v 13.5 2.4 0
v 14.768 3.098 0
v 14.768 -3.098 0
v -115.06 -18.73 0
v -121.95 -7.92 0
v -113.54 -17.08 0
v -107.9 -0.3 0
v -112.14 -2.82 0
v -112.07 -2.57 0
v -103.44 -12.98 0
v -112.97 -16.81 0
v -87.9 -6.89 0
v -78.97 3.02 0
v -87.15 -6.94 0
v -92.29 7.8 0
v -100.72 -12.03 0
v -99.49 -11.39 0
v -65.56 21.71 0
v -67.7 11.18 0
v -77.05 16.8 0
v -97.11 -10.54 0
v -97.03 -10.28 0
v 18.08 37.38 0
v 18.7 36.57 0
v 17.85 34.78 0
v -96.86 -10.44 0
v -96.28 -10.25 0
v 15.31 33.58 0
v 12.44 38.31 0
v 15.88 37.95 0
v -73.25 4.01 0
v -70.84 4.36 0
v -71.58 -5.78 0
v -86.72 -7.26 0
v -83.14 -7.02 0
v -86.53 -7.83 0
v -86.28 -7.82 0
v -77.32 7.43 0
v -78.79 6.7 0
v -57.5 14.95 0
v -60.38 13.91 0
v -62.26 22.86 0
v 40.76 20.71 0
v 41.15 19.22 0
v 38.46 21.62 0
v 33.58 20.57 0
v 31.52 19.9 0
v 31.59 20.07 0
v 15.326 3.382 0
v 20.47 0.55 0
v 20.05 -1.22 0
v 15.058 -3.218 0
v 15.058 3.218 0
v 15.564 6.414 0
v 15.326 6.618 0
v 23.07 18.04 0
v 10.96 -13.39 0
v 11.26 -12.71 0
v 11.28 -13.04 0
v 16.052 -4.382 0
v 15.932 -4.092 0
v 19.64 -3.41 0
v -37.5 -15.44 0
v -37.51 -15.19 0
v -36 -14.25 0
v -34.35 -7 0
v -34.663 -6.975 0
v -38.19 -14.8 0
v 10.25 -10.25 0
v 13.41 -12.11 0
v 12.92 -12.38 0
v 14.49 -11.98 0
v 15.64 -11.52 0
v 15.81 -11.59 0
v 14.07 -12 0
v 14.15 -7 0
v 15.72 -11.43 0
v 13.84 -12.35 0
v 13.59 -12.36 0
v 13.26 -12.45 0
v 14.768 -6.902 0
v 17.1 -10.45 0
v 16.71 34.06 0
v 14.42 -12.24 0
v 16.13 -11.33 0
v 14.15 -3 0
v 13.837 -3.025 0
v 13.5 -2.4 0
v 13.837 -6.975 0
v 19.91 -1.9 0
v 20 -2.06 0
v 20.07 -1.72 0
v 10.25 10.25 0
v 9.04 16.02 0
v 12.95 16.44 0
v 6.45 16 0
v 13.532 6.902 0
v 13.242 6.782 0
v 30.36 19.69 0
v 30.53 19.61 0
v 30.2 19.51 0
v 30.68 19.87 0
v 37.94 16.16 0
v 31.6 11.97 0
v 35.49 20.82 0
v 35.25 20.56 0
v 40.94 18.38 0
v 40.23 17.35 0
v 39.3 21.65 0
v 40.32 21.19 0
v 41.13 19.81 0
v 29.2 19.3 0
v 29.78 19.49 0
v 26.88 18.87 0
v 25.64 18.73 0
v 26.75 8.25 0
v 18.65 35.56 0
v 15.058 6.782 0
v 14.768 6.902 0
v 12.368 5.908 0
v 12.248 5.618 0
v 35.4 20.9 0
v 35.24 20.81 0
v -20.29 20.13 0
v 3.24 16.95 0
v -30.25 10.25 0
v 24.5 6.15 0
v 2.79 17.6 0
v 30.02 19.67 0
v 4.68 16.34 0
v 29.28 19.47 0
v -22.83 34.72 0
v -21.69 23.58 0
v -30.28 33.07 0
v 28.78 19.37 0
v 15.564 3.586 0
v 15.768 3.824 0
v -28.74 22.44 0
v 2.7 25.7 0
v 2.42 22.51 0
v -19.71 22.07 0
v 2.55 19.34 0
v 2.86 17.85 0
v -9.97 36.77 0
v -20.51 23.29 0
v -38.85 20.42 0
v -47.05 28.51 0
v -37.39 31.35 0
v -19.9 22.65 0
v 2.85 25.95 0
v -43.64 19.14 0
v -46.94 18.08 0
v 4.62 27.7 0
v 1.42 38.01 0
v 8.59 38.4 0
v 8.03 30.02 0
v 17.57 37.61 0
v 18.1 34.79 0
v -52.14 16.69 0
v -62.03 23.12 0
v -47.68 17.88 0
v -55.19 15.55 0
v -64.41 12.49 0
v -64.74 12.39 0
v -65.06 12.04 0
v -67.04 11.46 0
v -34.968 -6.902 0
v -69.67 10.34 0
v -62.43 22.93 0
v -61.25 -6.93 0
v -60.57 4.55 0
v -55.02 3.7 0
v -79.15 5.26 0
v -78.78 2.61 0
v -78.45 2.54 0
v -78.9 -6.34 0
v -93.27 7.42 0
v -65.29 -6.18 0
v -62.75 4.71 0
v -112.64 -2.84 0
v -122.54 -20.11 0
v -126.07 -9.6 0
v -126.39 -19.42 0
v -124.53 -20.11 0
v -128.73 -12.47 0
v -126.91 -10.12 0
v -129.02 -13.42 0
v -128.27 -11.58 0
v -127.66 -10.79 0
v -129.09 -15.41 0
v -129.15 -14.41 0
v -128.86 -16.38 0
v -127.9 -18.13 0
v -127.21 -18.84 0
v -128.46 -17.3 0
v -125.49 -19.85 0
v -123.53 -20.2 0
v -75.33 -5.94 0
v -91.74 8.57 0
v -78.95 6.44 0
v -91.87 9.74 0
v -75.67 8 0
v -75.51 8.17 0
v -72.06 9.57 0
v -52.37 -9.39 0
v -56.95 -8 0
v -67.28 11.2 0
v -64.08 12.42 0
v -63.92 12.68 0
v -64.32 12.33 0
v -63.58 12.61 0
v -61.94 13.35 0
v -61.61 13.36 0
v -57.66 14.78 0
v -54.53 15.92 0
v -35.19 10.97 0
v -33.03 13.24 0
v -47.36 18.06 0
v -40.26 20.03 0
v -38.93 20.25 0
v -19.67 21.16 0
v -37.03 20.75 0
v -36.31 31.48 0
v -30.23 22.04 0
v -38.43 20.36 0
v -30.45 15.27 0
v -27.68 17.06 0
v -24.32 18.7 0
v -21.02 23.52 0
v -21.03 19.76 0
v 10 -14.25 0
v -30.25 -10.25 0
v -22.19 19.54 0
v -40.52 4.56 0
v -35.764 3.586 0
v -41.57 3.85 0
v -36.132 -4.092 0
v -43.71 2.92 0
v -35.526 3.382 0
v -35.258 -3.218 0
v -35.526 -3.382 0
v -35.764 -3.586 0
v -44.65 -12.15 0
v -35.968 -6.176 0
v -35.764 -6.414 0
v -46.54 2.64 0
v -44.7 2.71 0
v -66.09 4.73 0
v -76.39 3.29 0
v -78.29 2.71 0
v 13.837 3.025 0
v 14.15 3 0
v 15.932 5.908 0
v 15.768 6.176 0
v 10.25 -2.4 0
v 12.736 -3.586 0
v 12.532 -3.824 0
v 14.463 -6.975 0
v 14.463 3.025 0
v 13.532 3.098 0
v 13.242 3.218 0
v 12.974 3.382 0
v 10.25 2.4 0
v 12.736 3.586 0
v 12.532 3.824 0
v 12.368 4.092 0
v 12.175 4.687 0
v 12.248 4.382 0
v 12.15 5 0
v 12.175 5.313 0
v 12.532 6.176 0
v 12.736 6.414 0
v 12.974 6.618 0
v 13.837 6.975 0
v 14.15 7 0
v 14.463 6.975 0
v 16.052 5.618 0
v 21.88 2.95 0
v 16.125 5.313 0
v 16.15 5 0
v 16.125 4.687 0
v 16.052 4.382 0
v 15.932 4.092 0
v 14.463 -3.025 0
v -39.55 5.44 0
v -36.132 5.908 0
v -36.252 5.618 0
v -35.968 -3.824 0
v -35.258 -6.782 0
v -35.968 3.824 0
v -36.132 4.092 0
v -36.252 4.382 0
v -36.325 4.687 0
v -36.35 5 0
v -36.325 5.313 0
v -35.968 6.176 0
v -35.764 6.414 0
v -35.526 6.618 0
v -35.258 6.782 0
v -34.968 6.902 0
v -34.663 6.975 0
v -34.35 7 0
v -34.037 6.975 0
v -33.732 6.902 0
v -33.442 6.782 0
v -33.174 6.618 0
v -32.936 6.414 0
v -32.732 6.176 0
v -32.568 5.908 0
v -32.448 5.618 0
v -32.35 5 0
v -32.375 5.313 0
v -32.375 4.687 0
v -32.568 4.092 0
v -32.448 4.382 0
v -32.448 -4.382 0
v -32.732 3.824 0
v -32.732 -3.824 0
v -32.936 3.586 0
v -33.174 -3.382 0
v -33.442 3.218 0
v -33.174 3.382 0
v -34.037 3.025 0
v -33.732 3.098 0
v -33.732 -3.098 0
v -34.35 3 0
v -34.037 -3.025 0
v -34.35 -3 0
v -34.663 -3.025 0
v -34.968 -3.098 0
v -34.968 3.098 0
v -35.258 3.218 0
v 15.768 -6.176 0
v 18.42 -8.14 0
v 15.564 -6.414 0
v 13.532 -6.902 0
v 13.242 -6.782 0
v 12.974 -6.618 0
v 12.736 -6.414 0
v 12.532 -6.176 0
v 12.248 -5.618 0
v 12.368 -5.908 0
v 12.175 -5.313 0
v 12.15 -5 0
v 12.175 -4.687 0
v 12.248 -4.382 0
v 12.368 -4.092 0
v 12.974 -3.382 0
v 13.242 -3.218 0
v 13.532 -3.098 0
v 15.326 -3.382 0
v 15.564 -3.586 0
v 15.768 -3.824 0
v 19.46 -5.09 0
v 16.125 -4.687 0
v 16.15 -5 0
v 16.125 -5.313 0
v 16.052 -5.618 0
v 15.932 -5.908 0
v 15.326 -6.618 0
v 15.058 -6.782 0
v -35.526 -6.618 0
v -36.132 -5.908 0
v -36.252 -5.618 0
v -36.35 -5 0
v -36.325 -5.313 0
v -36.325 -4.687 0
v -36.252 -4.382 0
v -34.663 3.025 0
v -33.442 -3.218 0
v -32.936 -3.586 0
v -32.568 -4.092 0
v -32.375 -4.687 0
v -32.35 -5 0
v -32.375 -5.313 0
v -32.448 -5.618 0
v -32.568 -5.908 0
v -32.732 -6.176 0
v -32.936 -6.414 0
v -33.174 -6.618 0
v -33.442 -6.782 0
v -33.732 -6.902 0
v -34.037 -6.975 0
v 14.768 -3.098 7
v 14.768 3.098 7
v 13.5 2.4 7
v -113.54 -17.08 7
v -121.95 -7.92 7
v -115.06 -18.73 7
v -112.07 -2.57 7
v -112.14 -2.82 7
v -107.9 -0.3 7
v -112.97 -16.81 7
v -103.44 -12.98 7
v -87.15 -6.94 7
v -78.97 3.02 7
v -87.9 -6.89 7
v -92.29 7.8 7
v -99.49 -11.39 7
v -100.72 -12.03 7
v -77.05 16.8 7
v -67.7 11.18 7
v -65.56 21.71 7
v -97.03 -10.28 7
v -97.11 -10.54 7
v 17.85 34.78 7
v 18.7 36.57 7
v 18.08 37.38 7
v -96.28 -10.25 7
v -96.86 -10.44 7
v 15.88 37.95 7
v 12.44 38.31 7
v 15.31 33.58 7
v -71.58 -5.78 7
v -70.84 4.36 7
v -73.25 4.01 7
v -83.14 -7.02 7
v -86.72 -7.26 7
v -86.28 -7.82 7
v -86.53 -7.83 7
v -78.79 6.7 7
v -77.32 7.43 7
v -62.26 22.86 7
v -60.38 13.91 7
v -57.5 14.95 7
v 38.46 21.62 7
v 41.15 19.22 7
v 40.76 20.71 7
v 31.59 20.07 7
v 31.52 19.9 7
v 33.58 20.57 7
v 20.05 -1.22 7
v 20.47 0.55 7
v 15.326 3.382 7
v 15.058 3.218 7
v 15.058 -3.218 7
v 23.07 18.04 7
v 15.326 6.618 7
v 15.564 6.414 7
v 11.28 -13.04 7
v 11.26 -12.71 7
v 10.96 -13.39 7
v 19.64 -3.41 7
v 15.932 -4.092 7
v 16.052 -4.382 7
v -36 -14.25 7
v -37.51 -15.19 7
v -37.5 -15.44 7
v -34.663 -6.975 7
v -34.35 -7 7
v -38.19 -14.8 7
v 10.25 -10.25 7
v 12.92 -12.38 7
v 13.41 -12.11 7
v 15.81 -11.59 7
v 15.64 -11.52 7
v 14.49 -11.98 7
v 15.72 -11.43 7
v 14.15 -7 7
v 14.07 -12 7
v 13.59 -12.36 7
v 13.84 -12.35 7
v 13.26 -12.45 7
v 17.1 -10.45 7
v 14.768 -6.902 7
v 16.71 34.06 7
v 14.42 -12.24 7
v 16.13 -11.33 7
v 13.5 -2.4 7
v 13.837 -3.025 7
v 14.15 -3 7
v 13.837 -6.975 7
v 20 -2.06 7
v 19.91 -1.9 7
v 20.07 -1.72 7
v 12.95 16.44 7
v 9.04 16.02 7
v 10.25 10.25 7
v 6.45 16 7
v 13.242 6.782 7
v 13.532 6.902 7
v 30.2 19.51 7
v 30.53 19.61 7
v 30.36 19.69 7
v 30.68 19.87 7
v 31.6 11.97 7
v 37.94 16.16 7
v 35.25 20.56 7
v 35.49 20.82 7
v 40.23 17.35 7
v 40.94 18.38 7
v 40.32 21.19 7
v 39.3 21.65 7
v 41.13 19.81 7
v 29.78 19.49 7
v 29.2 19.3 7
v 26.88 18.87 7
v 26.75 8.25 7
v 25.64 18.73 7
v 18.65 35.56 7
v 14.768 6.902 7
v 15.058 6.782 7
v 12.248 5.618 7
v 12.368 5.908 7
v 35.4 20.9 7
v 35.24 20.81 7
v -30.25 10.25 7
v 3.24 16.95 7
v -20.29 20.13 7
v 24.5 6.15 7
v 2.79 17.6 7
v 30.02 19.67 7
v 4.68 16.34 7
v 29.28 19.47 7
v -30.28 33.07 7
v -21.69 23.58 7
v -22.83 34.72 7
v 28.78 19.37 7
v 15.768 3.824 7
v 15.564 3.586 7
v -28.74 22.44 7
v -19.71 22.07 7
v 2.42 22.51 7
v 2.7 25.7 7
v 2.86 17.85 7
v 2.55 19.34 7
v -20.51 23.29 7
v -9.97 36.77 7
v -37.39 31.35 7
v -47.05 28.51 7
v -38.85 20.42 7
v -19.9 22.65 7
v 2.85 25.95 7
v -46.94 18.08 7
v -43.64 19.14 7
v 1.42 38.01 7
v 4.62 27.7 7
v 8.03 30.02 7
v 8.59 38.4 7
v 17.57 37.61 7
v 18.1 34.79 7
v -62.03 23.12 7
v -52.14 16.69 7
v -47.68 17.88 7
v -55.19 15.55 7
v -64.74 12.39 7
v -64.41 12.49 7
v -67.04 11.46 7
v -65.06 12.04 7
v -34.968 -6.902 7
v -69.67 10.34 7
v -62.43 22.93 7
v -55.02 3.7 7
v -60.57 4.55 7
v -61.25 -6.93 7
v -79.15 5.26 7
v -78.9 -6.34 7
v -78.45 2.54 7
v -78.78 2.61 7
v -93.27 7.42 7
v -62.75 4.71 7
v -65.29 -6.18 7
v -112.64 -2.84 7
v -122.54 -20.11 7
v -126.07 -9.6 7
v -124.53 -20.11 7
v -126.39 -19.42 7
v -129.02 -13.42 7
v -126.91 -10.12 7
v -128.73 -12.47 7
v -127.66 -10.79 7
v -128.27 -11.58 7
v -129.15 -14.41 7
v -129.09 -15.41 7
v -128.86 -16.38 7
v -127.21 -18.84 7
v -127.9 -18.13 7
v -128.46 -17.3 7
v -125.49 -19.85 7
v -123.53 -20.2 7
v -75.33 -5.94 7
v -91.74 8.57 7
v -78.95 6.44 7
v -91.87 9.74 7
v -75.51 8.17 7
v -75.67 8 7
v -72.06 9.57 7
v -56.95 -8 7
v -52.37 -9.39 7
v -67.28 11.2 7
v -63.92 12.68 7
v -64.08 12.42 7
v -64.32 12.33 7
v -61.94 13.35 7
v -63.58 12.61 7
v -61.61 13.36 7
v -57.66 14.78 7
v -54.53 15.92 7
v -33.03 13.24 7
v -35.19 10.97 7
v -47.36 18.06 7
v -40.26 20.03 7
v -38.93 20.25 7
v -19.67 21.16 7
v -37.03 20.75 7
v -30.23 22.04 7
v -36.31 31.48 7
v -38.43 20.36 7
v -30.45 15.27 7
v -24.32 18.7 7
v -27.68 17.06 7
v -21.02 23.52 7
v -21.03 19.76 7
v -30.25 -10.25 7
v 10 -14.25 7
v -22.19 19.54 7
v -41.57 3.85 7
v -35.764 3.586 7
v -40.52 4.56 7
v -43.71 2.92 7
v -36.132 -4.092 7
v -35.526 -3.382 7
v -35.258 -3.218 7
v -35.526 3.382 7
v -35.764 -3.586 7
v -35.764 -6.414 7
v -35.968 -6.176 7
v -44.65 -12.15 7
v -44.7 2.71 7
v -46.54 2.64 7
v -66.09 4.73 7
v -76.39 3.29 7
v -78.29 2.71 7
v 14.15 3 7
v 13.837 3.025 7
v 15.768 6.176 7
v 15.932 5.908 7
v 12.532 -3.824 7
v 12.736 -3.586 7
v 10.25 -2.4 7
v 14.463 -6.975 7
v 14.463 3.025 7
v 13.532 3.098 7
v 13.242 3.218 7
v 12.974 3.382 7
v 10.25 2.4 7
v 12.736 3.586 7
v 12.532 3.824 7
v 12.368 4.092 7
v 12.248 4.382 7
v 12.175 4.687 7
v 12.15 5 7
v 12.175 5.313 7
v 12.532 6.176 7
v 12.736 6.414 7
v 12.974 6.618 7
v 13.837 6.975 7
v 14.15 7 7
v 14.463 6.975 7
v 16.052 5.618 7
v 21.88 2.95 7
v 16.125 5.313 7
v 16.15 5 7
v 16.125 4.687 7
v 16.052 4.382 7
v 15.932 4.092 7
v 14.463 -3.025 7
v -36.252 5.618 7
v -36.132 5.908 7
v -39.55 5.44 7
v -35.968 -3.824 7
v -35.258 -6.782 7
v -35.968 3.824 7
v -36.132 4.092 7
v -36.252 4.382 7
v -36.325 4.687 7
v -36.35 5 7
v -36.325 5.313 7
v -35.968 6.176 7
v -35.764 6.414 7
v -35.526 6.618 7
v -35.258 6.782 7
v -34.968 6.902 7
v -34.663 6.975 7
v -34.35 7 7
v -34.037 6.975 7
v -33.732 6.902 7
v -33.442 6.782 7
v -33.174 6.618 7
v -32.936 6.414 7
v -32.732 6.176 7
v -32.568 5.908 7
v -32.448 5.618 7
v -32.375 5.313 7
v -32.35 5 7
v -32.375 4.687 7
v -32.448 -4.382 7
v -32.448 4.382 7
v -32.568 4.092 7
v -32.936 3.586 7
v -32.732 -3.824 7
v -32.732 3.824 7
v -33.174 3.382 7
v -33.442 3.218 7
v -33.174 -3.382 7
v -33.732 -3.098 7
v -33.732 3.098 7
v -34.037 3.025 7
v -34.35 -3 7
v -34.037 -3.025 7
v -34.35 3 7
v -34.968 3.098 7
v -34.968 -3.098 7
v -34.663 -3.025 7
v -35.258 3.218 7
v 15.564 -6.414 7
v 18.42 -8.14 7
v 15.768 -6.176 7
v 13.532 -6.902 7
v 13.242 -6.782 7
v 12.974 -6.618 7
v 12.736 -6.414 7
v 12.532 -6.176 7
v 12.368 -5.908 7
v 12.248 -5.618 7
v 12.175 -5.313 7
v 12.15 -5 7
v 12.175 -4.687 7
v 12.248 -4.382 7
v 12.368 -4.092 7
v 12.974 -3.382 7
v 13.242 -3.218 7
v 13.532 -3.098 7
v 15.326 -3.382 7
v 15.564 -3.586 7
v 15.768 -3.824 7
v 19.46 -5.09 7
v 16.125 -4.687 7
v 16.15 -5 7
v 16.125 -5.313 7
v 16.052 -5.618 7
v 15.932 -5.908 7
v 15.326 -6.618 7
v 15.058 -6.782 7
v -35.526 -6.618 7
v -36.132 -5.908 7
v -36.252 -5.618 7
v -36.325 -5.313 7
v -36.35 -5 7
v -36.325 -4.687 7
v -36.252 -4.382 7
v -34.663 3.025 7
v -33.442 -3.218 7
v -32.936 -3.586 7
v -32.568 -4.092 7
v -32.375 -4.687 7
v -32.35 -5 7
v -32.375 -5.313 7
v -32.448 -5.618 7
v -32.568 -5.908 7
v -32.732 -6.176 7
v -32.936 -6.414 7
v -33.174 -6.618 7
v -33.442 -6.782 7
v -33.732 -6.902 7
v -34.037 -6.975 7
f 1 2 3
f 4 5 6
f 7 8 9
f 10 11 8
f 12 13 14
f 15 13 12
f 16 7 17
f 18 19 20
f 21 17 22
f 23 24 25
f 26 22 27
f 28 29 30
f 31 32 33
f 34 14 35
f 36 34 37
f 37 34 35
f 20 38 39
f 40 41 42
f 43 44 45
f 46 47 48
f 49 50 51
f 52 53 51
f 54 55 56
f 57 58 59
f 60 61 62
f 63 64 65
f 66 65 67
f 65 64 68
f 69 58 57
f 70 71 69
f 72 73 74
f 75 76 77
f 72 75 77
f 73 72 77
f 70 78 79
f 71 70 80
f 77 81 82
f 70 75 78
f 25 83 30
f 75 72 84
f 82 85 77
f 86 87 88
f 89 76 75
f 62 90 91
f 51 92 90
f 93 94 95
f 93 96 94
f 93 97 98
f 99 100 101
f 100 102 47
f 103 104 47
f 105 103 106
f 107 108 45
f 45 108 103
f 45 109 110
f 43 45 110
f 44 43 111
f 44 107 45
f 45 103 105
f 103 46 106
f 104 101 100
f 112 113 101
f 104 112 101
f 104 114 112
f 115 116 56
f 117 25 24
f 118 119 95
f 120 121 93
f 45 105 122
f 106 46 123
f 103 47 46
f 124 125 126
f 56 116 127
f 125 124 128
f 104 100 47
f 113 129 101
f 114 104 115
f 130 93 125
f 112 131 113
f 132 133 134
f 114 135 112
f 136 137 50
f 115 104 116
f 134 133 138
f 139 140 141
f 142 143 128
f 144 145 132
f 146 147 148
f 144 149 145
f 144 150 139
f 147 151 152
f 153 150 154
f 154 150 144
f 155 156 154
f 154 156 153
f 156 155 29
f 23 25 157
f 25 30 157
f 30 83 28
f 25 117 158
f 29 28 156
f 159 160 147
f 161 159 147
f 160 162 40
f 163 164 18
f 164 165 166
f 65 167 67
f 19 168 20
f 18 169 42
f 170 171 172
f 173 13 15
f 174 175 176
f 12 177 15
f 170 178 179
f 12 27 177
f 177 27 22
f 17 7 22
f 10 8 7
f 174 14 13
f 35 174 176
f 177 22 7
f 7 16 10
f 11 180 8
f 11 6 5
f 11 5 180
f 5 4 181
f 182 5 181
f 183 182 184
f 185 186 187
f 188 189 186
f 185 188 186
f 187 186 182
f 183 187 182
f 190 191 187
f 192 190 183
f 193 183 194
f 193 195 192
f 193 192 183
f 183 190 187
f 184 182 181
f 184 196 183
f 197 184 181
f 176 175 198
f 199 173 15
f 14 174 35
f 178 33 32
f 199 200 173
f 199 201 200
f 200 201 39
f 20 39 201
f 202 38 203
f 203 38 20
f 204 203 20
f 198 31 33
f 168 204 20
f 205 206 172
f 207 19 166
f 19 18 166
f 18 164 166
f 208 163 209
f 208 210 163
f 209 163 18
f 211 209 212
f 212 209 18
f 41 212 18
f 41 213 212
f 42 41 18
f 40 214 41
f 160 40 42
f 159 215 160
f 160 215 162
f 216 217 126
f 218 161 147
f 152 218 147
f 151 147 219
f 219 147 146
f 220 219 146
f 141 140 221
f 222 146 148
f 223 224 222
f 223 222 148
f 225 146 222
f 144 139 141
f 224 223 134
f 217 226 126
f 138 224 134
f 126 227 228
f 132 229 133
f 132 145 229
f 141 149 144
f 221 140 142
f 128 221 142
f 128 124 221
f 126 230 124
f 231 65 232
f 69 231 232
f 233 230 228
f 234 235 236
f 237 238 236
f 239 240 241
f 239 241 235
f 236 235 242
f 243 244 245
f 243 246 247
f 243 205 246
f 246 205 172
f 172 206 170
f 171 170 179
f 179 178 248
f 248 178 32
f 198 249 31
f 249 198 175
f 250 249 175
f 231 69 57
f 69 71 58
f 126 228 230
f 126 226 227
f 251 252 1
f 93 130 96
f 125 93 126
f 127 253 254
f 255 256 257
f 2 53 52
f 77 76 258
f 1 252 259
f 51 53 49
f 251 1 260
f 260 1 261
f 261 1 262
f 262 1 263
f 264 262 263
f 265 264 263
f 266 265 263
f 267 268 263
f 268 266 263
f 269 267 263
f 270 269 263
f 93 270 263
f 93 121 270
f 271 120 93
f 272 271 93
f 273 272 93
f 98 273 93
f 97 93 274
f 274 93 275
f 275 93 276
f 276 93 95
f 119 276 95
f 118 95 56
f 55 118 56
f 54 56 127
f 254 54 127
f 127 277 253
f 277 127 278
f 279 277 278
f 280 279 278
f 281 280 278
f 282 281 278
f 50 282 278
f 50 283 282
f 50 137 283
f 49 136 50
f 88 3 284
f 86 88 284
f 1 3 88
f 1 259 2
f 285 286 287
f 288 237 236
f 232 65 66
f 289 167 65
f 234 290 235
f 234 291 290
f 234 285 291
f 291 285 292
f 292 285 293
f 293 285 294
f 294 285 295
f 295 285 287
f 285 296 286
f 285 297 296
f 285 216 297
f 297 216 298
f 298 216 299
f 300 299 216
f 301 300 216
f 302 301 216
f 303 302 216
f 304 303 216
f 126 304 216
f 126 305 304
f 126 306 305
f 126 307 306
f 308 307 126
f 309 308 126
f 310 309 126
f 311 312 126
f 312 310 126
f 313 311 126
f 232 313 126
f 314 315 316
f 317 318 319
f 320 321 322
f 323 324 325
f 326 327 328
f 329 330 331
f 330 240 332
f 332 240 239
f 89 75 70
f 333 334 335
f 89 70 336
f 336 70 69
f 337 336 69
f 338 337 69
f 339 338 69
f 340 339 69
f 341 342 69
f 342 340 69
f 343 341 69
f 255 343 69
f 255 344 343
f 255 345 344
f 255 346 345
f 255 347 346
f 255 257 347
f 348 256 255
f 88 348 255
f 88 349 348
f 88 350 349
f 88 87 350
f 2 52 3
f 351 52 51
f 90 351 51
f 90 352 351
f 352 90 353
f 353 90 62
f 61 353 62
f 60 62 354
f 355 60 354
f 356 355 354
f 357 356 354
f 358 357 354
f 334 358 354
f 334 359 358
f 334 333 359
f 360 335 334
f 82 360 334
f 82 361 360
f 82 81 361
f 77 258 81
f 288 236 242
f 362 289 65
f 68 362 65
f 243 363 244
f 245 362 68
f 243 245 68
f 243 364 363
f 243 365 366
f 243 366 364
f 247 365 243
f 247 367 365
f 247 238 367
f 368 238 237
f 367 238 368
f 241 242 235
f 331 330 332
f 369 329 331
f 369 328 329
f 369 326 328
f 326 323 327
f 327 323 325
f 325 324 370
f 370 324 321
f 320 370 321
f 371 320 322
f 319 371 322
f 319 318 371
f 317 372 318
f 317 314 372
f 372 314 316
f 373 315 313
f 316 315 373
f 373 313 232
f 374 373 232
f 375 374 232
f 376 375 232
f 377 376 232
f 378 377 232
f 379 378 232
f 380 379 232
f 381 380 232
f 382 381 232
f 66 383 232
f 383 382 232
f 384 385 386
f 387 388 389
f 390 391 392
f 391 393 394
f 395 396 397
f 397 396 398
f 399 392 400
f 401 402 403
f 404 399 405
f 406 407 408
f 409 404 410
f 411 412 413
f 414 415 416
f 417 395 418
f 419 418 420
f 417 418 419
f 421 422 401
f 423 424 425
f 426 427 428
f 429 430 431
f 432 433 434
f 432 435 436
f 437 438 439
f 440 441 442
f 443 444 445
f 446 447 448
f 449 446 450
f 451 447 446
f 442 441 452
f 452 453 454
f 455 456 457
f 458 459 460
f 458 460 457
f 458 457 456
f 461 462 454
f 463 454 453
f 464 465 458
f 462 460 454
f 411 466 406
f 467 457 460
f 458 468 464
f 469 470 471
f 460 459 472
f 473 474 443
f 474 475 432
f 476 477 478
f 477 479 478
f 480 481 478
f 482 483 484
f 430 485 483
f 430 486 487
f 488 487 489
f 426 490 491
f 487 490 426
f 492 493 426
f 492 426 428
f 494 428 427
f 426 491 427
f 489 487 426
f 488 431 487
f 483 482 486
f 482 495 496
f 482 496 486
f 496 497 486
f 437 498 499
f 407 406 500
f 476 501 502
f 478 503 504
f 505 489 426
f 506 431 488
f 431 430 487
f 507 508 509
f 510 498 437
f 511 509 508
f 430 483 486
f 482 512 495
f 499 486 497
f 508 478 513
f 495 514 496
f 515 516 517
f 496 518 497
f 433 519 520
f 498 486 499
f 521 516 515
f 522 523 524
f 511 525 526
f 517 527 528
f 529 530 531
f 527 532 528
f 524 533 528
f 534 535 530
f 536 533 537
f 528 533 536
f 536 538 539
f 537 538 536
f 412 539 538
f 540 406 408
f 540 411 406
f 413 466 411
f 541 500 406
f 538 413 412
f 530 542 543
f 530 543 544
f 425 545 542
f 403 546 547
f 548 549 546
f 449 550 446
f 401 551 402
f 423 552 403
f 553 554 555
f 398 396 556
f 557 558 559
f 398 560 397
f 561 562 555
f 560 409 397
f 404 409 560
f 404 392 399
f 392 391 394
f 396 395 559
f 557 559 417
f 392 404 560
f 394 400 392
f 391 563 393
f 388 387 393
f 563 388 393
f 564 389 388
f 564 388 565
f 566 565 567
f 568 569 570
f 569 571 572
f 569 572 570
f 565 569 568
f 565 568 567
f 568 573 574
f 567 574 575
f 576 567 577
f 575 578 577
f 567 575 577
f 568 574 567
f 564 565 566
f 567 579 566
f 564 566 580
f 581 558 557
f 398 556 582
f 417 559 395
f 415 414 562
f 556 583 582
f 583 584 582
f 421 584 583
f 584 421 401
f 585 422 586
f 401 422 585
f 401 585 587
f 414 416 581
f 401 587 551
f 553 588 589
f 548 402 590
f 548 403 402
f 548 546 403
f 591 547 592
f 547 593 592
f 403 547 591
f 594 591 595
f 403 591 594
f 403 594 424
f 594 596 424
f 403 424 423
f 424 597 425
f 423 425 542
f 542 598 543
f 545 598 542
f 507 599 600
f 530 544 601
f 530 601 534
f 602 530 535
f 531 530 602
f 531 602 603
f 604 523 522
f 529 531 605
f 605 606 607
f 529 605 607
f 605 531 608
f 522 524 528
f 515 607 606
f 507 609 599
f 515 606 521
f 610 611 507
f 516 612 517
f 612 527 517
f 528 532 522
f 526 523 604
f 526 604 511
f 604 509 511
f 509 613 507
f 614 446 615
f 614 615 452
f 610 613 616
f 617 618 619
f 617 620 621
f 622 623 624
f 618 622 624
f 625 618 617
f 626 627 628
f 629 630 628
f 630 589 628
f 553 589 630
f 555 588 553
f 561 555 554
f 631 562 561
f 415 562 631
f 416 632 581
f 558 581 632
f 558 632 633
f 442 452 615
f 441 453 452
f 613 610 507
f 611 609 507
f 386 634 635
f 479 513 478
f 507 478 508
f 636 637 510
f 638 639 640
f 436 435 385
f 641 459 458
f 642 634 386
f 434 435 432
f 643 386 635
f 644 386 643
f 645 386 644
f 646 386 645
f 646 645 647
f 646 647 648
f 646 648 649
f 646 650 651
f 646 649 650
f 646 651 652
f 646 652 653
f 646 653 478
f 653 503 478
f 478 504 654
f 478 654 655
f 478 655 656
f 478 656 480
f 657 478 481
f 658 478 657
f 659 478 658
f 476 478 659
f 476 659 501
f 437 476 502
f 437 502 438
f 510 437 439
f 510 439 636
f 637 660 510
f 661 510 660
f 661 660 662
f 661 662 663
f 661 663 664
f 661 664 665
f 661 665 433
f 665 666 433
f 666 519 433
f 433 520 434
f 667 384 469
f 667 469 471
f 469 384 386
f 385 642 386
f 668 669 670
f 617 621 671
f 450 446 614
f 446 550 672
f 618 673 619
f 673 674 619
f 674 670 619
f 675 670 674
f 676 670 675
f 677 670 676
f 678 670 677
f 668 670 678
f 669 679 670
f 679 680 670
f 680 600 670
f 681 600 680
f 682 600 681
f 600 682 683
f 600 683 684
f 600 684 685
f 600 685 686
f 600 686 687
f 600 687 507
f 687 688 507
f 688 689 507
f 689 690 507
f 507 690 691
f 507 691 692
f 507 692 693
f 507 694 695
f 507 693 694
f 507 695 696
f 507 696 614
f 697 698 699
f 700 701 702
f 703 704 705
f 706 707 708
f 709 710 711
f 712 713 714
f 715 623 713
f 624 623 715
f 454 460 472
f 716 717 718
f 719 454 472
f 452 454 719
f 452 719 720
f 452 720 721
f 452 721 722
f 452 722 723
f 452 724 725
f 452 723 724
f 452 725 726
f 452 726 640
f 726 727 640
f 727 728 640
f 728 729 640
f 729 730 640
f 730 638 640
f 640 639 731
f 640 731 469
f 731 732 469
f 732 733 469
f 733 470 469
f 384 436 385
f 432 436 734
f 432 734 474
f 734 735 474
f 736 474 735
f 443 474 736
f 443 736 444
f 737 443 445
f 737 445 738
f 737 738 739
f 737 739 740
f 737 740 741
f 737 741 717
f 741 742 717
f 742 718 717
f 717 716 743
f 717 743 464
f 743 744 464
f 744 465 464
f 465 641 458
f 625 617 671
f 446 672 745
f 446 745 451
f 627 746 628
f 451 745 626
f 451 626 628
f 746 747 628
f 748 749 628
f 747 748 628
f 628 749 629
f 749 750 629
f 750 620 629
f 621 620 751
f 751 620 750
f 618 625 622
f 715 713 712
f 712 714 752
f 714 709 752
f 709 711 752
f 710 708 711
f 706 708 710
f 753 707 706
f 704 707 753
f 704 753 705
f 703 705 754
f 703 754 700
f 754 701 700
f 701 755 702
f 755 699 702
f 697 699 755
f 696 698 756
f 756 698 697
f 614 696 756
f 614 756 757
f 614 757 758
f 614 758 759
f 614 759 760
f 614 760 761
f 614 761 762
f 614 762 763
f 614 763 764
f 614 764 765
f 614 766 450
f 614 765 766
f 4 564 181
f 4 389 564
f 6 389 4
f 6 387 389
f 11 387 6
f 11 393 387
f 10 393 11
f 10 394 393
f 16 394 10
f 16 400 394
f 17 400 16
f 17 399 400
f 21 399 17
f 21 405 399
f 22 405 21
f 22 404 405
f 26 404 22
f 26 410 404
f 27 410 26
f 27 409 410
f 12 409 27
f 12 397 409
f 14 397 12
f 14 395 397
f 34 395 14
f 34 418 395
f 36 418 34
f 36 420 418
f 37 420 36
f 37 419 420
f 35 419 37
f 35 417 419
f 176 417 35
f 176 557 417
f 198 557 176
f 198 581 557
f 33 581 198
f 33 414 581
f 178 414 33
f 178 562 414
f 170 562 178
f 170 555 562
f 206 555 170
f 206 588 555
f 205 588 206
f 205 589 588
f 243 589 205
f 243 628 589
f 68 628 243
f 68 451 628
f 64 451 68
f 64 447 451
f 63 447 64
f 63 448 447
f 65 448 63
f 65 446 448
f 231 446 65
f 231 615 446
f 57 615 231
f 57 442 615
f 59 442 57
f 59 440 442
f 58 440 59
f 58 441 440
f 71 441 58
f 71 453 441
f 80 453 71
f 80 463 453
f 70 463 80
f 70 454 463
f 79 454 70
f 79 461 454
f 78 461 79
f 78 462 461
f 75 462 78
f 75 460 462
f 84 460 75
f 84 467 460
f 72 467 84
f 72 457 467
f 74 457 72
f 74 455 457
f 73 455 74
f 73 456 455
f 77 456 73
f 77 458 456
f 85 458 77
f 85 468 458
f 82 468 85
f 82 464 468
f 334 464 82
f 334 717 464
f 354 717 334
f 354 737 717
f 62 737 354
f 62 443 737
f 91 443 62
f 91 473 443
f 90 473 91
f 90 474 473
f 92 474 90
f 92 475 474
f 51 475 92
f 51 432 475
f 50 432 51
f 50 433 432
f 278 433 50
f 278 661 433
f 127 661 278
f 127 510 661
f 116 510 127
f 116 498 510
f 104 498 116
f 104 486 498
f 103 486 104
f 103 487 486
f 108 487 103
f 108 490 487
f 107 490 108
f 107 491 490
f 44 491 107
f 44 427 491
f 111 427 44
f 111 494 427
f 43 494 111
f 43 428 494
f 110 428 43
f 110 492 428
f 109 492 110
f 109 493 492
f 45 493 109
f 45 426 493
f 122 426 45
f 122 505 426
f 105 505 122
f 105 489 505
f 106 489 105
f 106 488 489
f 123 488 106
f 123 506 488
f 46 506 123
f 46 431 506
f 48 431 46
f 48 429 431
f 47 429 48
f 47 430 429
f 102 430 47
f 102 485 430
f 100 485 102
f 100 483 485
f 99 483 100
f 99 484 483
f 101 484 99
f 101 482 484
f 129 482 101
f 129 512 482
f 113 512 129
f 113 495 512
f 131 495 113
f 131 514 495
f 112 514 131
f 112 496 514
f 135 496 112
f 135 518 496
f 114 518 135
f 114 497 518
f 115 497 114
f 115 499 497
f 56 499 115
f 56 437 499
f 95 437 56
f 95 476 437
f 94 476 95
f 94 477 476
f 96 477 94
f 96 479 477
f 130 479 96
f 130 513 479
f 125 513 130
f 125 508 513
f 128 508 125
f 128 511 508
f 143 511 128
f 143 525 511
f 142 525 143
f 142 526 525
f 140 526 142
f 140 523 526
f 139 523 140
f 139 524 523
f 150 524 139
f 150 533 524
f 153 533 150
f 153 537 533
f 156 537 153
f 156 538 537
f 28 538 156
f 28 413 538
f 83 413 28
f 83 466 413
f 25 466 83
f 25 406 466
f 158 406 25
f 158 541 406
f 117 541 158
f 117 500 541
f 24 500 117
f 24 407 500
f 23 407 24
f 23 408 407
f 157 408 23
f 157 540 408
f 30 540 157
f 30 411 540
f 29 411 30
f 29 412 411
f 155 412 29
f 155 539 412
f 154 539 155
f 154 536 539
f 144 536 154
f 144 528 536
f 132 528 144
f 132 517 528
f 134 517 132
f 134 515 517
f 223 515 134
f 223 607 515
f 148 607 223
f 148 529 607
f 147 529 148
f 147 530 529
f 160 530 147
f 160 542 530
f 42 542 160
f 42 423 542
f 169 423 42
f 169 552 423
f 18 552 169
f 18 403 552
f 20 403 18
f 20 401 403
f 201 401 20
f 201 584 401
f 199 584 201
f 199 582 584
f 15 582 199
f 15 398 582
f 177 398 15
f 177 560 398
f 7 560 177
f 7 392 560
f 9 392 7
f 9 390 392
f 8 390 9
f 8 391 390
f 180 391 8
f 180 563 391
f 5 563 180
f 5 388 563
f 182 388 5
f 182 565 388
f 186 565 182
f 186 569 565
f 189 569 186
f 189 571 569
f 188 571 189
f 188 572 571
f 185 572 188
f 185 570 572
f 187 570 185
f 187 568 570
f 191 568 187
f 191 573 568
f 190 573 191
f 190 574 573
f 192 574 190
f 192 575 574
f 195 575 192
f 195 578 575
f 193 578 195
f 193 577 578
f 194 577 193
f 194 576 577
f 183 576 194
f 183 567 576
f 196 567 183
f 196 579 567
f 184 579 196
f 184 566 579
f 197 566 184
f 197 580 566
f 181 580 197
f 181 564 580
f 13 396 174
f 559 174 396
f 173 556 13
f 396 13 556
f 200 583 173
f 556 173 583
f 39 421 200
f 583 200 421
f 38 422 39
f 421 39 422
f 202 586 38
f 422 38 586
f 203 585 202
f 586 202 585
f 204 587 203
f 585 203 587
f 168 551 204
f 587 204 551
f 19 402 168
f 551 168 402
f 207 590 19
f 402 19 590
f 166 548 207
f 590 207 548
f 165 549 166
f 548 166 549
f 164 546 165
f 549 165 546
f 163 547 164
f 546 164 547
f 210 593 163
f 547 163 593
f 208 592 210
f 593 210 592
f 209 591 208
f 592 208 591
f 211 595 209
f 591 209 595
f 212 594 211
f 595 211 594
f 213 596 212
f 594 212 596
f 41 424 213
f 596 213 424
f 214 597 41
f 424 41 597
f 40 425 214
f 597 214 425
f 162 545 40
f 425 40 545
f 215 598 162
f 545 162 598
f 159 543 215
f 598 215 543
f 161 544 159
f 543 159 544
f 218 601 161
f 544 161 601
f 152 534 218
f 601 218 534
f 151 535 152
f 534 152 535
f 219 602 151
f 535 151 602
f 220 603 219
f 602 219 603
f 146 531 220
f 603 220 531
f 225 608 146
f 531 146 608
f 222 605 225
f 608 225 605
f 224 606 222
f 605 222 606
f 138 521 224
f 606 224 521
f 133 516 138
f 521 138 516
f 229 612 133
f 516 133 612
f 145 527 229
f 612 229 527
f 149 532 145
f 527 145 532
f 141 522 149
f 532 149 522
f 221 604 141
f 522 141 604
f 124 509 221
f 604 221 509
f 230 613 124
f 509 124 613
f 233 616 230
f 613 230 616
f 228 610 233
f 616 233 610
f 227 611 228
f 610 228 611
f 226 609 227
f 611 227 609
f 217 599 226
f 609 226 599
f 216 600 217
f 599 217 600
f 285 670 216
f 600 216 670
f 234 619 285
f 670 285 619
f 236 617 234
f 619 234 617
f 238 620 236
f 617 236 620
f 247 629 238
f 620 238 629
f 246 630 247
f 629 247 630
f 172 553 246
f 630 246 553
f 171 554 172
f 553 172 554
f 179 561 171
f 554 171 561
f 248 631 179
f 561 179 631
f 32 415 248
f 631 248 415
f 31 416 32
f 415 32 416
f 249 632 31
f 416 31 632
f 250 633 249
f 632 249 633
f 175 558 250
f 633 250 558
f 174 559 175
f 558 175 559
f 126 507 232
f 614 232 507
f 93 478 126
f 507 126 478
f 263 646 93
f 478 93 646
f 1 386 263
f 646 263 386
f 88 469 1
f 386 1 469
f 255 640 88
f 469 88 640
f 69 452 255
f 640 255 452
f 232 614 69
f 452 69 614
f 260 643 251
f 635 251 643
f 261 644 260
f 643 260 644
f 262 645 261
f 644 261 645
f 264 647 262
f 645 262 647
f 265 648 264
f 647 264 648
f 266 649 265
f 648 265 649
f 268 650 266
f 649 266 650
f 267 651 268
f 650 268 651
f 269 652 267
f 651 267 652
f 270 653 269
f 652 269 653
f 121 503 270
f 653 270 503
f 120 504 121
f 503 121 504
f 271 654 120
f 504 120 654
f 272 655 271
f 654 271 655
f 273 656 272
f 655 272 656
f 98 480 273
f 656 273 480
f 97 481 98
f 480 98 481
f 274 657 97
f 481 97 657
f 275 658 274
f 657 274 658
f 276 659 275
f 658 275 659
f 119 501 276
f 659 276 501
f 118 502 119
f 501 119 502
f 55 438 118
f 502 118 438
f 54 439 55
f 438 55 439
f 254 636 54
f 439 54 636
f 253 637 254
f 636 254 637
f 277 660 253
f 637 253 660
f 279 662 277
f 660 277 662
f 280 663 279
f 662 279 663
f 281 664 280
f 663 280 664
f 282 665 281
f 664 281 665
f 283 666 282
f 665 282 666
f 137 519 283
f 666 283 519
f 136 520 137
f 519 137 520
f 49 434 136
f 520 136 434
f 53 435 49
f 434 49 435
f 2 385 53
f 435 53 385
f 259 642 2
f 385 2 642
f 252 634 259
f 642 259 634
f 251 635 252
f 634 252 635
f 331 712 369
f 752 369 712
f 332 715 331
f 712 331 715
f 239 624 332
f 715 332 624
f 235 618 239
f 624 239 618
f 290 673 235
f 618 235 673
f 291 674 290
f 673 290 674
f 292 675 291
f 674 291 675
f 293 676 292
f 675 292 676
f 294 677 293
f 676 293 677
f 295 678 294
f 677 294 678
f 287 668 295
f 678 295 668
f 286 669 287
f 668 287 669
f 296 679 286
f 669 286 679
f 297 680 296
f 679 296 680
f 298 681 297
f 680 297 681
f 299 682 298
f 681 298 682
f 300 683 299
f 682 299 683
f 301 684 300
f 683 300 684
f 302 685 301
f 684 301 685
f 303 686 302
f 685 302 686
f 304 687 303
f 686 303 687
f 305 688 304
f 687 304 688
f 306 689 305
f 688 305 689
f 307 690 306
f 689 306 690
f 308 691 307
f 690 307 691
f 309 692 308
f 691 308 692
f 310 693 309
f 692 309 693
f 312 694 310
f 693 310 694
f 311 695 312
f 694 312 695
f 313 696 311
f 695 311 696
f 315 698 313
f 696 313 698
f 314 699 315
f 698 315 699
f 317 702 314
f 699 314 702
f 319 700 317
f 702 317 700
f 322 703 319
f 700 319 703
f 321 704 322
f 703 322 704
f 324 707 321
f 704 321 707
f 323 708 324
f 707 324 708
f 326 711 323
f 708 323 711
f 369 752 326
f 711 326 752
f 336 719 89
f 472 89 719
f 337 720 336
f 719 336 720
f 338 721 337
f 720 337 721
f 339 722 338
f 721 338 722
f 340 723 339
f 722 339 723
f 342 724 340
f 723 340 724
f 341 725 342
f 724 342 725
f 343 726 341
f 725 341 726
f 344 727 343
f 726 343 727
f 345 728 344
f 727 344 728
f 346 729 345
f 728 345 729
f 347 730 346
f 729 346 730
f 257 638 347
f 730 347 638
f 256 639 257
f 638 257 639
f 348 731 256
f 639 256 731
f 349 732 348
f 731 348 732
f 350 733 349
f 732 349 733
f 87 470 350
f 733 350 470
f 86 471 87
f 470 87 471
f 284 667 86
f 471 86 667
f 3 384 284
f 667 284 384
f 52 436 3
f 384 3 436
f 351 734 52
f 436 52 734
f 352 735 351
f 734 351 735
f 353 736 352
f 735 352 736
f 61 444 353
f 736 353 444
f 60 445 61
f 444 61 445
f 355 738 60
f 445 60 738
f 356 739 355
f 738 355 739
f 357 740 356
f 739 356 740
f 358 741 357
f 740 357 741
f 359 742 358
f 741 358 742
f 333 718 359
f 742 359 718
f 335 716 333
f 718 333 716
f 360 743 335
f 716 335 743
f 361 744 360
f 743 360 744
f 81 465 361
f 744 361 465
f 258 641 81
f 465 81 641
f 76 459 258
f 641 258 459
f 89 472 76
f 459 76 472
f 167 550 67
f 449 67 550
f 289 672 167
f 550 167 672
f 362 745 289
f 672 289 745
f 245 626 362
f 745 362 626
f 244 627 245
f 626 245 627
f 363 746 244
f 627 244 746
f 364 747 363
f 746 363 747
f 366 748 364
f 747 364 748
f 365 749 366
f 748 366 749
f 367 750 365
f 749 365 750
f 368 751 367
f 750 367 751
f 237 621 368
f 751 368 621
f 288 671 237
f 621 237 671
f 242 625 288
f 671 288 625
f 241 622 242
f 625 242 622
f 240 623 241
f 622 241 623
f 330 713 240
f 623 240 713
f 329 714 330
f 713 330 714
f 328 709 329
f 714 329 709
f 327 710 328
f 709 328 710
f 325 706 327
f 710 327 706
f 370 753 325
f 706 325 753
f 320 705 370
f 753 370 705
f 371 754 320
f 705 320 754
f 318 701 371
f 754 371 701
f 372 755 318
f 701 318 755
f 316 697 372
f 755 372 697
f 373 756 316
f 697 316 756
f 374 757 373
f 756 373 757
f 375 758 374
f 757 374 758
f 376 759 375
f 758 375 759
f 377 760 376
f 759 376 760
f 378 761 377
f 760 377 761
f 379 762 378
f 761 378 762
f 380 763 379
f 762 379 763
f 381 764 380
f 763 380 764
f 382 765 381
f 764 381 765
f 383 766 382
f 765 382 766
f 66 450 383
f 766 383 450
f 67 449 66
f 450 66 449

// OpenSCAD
// ==============================================================================
// Lasius Hexapod - Tibia (Unterschenkel / Sichelkralle)
// Parametric CAD Model generated from 600 DPI calibrated flatbed scan
//
// Kinematic Reference: Knee Pivot Axis = (0, 0)
// Distance Knee Pivot to Foot Tip: 129.95 mm (nominal 130.0 mm DH kinematics)
// Servo: Torcster NR-645 MG BB 59g (standard 40.2 x 20.1 mm case)
// Plate thickness: 7.0 mm | Servo holes: 4.0 mm standalone through holes
// Foot tip: Tangential smooth circular rounding (R = 5.60 mm)
// Cable notch: [10.25..13.50] x [-2.40..2.40] between mounting holes
// ==============================================================================

$fn = 40;

// --- Parametric Parameters ---
tibia_thickness = 7.0;       // Plate thickness: 7.0 mm
servo_hole_dia  = 4.0;       // Servo mounting holes: 4.0 mm through hole
foot_hole_dia   = 3.0;       // Foot accessory / bumper hole (M3): 3.0 mm

// Mode selector: "3d" for 3D model (default), "2d" for DXF/SVG laser export
mode = "3d";

// --- 2D Contours ---
outer_polygon = [
    [-129.15, -14.41], [-129.02, -13.42], [-128.73, -12.47], [-128.27, -11.58],
    [-127.66, -10.79], [-126.91, -10.12], [-126.07, -9.60], [-121.95, -7.92],
    [-112.64, -2.84], [-112.14, -2.82], [-112.07, -2.57], [-107.90, -0.30],
    [-93.27, 7.42], [-92.29, 7.80], [-91.74, 8.57], [-91.87, 9.74],
    [-77.05, 16.80], [-65.56, 21.71], [-62.43, 22.93], [-62.26, 22.86],
    [-62.03, 23.12], [-47.05, 28.51], [-37.39, 31.35], [-36.31, 31.48],
    [-30.28, 33.07], [-22.83, 34.72], [-9.97, 36.77], [1.42, 38.01],
    [8.59, 38.40], [12.44, 38.31], [15.88, 37.95], [17.57, 37.61],
    [18.08, 37.38], [18.70, 36.57], [18.65, 35.56], [18.10, 34.79],
    [17.85, 34.78], [16.71, 34.06], [15.31, 33.58], [8.03, 30.02],
    [4.62, 27.70], [2.85, 25.95], [2.70, 25.70], [2.42, 22.51],
    [2.55, 19.34], [2.86, 17.85], [2.79, 17.60], [3.24, 16.95],
    [4.68, 16.34], [6.45, 16.00], [9.04, 16.02], [12.95, 16.44],
    [23.07, 18.04], [25.64, 18.73], [26.88, 18.87], [28.78, 19.37],
    [29.20, 19.30], [29.28, 19.47], [29.78, 19.49], [30.02, 19.67],
    [30.20, 19.51], [30.36, 19.69], [30.53, 19.61], [30.68, 19.87],
    [31.52, 19.90], [31.59, 20.07], [33.58, 20.57], [35.24, 20.81],
    [35.25, 20.56], [35.49, 20.82], [35.40, 20.90], [38.46, 21.62],
    [39.30, 21.65], [40.32, 21.19], [40.76, 20.71], [41.13, 19.81],
    [41.15, 19.22], [40.94, 18.38], [40.23, 17.35], [37.94, 16.16],
    [31.60, 11.97], [26.75, 8.25], [24.50, 6.15], [21.88, 2.95],
    [20.47, 0.55], [20.05, -1.22], [20.07, -1.72], [19.91, -1.90],
    [20.00, -2.06], [19.64, -3.41], [19.46, -5.09], [18.42, -8.14],
    [17.10, -10.45], [16.13, -11.33], [15.72, -11.43], [15.64, -11.52],
    [15.81, -11.59], [14.49, -11.98], [14.42, -12.24], [14.07, -12.00],
    [13.84, -12.35], [13.59, -12.36], [13.41, -12.11], [13.26, -12.45],
    [12.92, -12.38], [11.26, -12.71], [11.28, -13.04], [10.96, -13.39],
    [10.00, -14.25], [-36.00, -14.25], [-37.50, -15.44], [-37.51, -15.19],
    [-38.19, -14.80], [-44.65, -12.15], [-52.37, -9.39], [-56.95, -8.00],
    [-61.25, -6.93], [-65.29, -6.18], [-71.58, -5.78], [-75.33, -5.94],
    [-78.90, -6.34], [-83.14, -7.02], [-86.28, -7.82], [-86.53, -7.83],
    [-86.72, -7.26], [-87.15, -6.94], [-87.90, -6.89], [-96.28, -10.25],
    [-96.86, -10.44], [-97.03, -10.28], [-97.11, -10.54], [-99.49, -11.39],
    [-100.72, -12.03], [-103.44, -12.98], [-112.97, -16.81], [-113.54, -17.08],
    [-115.06, -18.73], [-122.54, -20.11], [-123.53, -20.20], [-124.53, -20.11],
    [-125.49, -19.85], [-126.39, -19.42], [-127.21, -18.84], [-127.90, -18.13],
    [-128.46, -17.30], [-128.86, -16.38], [-129.09, -15.41]
];

slot_polygon = [
    [-79.15, 5.26], [-78.95, 6.44], [-78.79, 6.70], [-77.32, 7.43],
    [-75.67, 8.00], [-75.51, 8.17], [-72.06, 9.57], [-69.67, 10.34],
    [-67.70, 11.18], [-67.28, 11.20], [-67.04, 11.46], [-65.06, 12.04],
    [-64.74, 12.39], [-64.41, 12.49], [-64.32, 12.33], [-64.08, 12.42],
    [-63.92, 12.68], [-63.58, 12.61], [-61.94, 13.35], [-61.61, 13.36],
    [-60.38, 13.91], [-57.66, 14.78], [-57.50, 14.95], [-55.19, 15.55],
    [-54.53, 15.92], [-52.14, 16.69], [-47.68, 17.88], [-47.36, 18.06],
    [-46.94, 18.08], [-43.64, 19.14], [-40.26, 20.03], [-38.93, 20.25],
    [-38.85, 20.42], [-38.43, 20.36], [-37.03, 20.75], [-30.23, 22.04],
    [-28.74, 22.44], [-21.69, 23.58], [-21.02, 23.52], [-20.51, 23.29],
    [-19.90, 22.65], [-19.71, 22.07], [-19.67, 21.16], [-20.29, 20.13],
    [-21.03, 19.76], [-22.19, 19.54], [-24.32, 18.70], [-27.68, 17.06],
    [-30.45, 15.27], [-33.03, 13.24], [-35.19, 10.97], [-39.55, 5.44],
    [-40.52, 4.56], [-41.57, 3.85], [-43.71, 2.92], [-44.70, 2.71],
    [-46.54, 2.64], [-55.02, 3.70], [-60.57, 4.55], [-62.75, 4.71],
    [-66.09, 4.73], [-70.84, 4.36], [-73.25, 4.01], [-76.39, 3.29],
    [-78.29, 2.71], [-78.45, 2.54], [-78.78, 2.61], [-78.97, 3.02],
    [-79.15, 5.26]
];

// Servo cutout with cable exit notch centered between the two mounting holes
servo_window_polygon = [
    [-30.25, -10.25],
    [10.25, -10.25],
    [10.25, -2.40],
    [13.50, -2.40],
    [13.50, 2.40],
    [10.25, 2.40],
    [10.25, 10.25],
    [-30.25, 10.25]
];

// 2D Profile
module tibia_2d() {
    difference() {
        polygon(outer_polygon);
        polygon(slot_polygon);
        polygon(servo_window_polygon);
        
        // 4x Standalone Servo mounting holes (Ø 4.0 mm)
        translate([14.15, 5.00]) circle(d = servo_hole_dia);
        translate([14.15, -5.00]) circle(d = servo_hole_dia);
        translate([-34.35, 5.00]) circle(d = servo_hole_dia);
        translate([-34.35, -5.00]) circle(d = servo_hole_dia);
        
        // Foot bumper / accessory hole (Ø 3.0 mm)
        translate([-93.00, -11.50]) circle(d = foot_hole_dia);
    }
}

// 3D Model
module tibia_3d() {
    linear_extrude(height = tibia_thickness, convexity = 10)
        tibia_2d();
}

// Render selection
if (mode == "2d") {
    tibia_2d();
} else {
    tibia_3d();
}
